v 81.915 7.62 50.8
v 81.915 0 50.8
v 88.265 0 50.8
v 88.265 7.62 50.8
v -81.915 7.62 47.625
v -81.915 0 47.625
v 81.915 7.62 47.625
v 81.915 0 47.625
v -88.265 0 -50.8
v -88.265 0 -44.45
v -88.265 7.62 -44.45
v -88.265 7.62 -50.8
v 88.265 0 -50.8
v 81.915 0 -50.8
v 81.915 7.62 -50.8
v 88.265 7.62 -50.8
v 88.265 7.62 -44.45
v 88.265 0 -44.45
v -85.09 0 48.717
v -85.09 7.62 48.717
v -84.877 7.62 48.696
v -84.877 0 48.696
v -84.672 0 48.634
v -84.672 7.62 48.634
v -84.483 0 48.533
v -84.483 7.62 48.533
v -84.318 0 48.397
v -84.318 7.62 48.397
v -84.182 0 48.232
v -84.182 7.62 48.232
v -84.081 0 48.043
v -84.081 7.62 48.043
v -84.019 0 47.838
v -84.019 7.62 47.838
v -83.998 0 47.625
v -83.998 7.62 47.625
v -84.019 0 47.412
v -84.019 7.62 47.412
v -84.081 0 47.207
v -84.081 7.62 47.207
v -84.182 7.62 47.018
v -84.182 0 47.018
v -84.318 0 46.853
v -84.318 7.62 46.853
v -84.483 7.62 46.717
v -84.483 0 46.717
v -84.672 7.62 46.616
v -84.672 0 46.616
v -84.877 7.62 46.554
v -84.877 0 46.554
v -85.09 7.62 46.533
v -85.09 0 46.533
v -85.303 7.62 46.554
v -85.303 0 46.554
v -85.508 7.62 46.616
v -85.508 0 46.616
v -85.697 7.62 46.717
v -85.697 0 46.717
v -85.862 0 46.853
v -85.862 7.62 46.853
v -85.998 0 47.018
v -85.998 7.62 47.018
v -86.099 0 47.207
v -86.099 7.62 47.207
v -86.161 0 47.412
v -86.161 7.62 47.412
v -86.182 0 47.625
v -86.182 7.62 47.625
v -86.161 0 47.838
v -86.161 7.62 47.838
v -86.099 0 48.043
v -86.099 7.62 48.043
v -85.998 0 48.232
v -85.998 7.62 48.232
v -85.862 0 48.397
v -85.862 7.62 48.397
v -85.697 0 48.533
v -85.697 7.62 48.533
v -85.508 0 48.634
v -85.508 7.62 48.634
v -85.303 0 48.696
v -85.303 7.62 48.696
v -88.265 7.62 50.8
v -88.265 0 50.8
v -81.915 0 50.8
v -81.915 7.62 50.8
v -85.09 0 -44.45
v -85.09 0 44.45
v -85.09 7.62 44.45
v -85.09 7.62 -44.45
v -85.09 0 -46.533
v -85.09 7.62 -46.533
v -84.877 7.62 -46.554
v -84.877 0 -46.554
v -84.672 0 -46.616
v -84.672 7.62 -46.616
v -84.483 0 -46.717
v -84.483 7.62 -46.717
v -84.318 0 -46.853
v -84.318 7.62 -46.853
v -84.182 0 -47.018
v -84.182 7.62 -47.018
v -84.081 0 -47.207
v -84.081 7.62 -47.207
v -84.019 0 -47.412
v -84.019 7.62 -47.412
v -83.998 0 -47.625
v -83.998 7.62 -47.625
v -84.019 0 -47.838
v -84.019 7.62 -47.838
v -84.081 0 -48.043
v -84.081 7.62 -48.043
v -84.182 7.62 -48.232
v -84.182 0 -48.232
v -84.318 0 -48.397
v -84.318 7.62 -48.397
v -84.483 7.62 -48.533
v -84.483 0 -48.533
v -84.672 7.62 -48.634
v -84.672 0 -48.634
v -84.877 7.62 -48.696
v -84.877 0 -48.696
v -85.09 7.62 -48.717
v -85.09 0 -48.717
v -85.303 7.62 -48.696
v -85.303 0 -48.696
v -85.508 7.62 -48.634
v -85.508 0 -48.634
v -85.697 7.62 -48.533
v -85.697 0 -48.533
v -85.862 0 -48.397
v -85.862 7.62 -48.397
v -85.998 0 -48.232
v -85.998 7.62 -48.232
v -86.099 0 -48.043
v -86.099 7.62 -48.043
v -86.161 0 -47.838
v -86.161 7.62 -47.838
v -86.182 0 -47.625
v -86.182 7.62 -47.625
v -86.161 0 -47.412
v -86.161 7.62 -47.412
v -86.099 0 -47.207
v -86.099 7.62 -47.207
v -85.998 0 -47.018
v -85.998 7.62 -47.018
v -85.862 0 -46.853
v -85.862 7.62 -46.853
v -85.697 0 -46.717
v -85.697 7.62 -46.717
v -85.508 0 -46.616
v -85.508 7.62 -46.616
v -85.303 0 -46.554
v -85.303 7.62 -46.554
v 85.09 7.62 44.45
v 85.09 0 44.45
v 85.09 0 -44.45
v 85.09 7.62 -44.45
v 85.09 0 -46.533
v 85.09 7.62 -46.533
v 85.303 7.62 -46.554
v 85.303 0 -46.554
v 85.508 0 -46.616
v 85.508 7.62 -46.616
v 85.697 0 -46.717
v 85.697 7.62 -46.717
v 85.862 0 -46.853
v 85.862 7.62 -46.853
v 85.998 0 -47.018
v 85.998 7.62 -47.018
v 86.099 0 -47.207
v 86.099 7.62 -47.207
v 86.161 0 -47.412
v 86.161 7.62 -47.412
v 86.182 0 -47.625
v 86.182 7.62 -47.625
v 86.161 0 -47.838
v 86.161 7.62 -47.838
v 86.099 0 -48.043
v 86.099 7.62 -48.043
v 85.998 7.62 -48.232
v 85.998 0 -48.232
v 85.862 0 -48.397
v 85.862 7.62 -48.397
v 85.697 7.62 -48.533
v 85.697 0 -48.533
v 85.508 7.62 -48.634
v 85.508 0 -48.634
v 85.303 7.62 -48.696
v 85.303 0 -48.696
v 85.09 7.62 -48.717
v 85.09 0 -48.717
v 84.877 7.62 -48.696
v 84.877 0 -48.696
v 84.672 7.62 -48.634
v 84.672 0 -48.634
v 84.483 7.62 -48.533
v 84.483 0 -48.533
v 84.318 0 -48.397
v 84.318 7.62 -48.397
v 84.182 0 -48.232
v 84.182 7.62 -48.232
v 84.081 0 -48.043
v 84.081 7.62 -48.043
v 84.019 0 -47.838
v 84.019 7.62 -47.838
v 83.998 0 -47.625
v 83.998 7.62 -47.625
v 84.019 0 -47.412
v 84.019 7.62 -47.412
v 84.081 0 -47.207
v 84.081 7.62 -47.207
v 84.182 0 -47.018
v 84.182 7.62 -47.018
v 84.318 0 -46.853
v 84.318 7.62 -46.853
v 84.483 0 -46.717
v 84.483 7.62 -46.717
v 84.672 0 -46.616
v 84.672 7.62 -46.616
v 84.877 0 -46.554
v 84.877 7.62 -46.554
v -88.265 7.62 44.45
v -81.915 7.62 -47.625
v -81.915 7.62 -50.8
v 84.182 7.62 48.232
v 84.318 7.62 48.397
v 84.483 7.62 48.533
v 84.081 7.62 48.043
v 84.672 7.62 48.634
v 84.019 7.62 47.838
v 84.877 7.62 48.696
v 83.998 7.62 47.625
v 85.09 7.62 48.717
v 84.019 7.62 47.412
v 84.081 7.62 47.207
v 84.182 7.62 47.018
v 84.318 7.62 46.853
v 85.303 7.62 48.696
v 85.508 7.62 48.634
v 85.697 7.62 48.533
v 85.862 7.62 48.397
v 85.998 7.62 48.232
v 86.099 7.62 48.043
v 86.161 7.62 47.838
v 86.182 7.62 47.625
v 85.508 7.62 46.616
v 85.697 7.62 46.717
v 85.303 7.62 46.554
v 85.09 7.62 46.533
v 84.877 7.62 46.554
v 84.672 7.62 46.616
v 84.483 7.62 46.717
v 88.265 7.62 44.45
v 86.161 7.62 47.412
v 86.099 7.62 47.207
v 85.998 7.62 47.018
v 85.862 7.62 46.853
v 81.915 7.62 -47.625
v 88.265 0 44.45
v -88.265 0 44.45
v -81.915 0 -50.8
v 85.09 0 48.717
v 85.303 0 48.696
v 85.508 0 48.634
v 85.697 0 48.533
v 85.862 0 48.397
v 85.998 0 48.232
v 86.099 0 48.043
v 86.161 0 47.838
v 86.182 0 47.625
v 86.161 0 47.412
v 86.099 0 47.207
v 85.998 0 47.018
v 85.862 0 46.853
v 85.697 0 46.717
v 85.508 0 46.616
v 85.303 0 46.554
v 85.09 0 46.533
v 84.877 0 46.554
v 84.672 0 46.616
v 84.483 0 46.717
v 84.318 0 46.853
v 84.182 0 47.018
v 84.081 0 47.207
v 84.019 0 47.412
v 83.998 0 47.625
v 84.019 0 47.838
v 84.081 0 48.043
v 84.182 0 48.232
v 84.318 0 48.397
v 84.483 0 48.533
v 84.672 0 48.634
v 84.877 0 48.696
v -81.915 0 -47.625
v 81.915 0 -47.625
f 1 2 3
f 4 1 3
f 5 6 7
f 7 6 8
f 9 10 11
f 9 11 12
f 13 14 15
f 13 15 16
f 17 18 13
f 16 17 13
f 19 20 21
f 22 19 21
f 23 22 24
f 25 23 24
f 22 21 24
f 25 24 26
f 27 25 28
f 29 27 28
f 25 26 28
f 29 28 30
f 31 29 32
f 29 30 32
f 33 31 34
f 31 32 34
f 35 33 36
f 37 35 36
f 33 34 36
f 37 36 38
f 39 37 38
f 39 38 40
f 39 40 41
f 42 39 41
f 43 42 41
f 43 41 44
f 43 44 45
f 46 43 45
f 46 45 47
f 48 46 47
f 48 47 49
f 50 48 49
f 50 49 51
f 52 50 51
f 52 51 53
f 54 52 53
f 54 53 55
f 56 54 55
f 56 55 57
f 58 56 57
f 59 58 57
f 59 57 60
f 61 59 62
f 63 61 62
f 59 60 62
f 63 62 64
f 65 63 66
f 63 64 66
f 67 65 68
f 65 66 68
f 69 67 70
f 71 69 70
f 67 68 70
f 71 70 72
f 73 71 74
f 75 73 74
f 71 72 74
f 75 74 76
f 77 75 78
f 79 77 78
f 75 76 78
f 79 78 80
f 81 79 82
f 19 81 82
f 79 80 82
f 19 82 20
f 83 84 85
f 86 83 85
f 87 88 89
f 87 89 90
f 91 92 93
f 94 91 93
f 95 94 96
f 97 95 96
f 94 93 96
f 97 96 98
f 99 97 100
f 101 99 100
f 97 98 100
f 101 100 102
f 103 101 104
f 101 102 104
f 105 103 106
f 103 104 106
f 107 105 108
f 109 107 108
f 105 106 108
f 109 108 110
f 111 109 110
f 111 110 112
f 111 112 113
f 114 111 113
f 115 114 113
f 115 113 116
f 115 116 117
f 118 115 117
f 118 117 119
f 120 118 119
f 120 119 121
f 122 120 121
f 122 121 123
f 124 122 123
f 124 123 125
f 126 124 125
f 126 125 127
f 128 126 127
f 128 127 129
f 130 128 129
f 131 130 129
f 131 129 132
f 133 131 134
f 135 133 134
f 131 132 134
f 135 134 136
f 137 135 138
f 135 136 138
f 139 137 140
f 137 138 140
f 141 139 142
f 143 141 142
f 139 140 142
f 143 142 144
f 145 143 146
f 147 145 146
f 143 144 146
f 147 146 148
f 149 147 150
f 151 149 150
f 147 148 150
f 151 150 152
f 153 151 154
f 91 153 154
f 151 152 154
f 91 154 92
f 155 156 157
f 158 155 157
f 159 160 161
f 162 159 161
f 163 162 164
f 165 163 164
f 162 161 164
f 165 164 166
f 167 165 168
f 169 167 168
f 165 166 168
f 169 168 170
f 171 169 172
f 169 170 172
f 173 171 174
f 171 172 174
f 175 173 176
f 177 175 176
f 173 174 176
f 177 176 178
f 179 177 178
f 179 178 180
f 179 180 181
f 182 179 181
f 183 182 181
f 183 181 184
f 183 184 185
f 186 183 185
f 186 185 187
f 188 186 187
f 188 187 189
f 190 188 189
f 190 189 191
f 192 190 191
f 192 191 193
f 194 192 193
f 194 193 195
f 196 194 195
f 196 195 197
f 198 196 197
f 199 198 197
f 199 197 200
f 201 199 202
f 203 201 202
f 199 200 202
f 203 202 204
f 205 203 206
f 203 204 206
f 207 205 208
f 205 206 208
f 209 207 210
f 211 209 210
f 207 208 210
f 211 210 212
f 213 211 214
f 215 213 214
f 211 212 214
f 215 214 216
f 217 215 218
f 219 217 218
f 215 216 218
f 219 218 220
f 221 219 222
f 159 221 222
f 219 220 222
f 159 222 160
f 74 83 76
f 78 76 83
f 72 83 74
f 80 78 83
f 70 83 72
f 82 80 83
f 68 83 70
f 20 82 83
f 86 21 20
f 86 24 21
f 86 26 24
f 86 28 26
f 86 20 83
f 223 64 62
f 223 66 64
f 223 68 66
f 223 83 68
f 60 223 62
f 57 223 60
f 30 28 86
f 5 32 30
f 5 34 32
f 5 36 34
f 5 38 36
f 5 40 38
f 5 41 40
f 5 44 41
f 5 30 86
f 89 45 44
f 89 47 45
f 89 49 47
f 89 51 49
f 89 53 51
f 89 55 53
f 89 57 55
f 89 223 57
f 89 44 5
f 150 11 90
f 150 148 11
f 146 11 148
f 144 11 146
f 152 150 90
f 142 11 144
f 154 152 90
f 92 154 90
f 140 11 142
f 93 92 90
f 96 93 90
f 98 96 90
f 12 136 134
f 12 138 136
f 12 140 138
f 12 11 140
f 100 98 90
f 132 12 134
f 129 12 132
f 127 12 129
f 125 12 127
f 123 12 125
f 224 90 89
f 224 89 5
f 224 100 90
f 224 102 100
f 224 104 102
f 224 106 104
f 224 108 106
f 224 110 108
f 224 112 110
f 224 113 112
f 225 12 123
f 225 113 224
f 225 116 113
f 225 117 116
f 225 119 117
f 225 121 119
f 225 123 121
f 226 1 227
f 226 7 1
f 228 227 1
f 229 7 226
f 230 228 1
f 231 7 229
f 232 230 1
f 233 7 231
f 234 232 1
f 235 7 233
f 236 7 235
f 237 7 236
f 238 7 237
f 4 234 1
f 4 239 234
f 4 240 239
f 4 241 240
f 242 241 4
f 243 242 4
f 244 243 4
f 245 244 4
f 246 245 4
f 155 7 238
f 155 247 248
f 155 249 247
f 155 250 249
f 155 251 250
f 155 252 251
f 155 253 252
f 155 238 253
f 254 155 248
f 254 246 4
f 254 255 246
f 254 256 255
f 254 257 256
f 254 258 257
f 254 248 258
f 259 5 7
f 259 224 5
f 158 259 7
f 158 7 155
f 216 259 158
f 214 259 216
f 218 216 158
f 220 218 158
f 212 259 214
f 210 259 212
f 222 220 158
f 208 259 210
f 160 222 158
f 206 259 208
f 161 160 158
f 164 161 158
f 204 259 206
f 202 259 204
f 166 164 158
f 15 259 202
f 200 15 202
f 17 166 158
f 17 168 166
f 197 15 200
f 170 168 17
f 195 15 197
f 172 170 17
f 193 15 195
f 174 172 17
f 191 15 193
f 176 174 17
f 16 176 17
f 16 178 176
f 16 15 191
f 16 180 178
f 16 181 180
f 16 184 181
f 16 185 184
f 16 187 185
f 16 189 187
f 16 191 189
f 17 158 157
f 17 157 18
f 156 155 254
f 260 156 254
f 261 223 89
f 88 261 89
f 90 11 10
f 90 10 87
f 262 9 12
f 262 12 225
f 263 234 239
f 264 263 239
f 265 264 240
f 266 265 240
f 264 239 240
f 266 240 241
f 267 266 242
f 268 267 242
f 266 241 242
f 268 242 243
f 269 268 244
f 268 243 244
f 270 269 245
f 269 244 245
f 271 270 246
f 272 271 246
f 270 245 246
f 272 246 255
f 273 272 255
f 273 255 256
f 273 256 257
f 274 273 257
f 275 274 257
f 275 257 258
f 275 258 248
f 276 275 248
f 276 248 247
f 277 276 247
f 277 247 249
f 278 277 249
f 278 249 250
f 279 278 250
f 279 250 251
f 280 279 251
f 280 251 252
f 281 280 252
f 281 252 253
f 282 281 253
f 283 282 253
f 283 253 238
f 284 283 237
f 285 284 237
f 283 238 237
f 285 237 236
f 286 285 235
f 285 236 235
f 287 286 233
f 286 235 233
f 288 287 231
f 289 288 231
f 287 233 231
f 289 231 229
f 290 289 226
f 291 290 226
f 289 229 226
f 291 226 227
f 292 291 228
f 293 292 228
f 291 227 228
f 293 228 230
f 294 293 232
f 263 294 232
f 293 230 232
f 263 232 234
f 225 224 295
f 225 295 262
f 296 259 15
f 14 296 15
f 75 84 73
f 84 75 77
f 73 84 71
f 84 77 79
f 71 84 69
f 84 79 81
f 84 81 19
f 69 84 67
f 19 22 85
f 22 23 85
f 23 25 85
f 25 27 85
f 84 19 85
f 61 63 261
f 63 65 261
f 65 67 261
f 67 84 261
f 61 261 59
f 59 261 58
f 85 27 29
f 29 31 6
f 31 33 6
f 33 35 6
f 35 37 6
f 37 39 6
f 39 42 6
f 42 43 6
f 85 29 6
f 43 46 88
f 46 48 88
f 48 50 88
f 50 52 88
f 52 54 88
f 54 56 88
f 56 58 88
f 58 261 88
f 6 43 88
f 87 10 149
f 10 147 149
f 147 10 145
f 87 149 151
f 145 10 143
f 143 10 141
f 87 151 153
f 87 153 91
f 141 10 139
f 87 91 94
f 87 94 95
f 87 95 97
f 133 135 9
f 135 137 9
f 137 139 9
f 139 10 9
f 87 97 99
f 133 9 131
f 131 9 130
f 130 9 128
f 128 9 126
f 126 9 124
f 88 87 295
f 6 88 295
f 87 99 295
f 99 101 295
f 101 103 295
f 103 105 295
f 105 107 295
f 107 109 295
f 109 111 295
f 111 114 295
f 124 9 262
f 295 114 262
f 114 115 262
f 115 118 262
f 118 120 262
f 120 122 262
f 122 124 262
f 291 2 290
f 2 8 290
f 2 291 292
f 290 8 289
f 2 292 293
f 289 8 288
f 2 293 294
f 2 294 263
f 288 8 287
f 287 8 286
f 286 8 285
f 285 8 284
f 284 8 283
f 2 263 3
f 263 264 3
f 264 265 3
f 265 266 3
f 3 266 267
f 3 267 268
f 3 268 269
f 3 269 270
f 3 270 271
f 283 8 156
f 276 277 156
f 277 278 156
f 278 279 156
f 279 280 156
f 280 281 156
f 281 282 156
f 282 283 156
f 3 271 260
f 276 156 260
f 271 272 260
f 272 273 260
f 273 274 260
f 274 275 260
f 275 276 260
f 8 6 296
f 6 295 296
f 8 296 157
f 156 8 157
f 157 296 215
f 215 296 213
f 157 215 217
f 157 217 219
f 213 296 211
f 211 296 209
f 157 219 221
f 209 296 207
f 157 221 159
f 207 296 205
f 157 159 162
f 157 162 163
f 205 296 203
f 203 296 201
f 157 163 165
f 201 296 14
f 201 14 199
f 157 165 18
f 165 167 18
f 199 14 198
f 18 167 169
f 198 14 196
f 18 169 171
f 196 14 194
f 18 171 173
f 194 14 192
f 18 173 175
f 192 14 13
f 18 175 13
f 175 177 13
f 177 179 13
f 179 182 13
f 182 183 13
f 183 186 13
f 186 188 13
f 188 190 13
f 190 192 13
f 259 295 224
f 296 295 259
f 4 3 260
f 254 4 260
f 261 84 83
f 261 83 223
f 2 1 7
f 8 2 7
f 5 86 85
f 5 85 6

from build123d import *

# Parameters (mm, degrees)
SKETCH3_W           = 170.18
SKETCH3_H           = 95.25
BOSS_EXTRUDE1_DEPTH = 7.62
SKETCH4_W           = 6.35
SKETCH4_H           = 6.35
BOSS_EXTRUDE3_DEPTH = 7.62
SKETCH6_R           = 1.0922
CUT_EXTRUDE1_DEPTH  = 10.16


with BuildPart() as part:
    # Sketch3 → Boss-Extrude1 (new body)
    with BuildSketch(Plane(origin=(0, 0, 0), x_dir=(1, 0, 0), z_dir=(0, 1, 0))):
        Rectangle(SKETCH3_W, SKETCH3_H)
    extrude(amount=BOSS_EXTRUDE1_DEPTH)

    # Sketch4 → Boss-Extrude3 (add)
    with BuildSketch(Plane(origin=(0, 7.62, 0), x_dir=(1, 0, 0), z_dir=(0, 1, 0))):
        with Locations((-85.09, 47.625)):
            Rectangle(SKETCH4_W, SKETCH4_H)
        with Locations((-85.09, -47.625)):
            Rectangle(SKETCH4_W, SKETCH4_H)
        with Locations((85.09, 47.625)):
            Rectangle(SKETCH4_W, SKETCH4_H)
        with Locations((85.09, -47.625)):
            Rectangle(SKETCH4_W, SKETCH4_H)
    extrude(amount=-BOSS_EXTRUDE3_DEPTH)

    # Sketch6 → Cut-Extrude1 (cut)
    with BuildSketch(Plane(origin=(0, 7.62, 0), x_dir=(1, 0, 0), z_dir=(0, 1, 0))):
        with Locations(Location((-85.09, 47.625, 0), (0, 0, 270))):
            Circle(SKETCH6_R)
        with Locations(Location((-85.09, -47.625, 0), (0, 0, 270))):
            Circle(SKETCH6_R)
        with Locations(Location((85.09, -47.625, 0), (0, 0, 270))):
            Circle(SKETCH6_R)
        with Locations(Location((85.09, 47.625, 0), (0, 0, 270))):
            Circle(SKETCH6_R)
    extrude(amount=-CUT_EXTRUDE1_DEPTH, mode=Mode.SUBTRACT)


solid = part.part
